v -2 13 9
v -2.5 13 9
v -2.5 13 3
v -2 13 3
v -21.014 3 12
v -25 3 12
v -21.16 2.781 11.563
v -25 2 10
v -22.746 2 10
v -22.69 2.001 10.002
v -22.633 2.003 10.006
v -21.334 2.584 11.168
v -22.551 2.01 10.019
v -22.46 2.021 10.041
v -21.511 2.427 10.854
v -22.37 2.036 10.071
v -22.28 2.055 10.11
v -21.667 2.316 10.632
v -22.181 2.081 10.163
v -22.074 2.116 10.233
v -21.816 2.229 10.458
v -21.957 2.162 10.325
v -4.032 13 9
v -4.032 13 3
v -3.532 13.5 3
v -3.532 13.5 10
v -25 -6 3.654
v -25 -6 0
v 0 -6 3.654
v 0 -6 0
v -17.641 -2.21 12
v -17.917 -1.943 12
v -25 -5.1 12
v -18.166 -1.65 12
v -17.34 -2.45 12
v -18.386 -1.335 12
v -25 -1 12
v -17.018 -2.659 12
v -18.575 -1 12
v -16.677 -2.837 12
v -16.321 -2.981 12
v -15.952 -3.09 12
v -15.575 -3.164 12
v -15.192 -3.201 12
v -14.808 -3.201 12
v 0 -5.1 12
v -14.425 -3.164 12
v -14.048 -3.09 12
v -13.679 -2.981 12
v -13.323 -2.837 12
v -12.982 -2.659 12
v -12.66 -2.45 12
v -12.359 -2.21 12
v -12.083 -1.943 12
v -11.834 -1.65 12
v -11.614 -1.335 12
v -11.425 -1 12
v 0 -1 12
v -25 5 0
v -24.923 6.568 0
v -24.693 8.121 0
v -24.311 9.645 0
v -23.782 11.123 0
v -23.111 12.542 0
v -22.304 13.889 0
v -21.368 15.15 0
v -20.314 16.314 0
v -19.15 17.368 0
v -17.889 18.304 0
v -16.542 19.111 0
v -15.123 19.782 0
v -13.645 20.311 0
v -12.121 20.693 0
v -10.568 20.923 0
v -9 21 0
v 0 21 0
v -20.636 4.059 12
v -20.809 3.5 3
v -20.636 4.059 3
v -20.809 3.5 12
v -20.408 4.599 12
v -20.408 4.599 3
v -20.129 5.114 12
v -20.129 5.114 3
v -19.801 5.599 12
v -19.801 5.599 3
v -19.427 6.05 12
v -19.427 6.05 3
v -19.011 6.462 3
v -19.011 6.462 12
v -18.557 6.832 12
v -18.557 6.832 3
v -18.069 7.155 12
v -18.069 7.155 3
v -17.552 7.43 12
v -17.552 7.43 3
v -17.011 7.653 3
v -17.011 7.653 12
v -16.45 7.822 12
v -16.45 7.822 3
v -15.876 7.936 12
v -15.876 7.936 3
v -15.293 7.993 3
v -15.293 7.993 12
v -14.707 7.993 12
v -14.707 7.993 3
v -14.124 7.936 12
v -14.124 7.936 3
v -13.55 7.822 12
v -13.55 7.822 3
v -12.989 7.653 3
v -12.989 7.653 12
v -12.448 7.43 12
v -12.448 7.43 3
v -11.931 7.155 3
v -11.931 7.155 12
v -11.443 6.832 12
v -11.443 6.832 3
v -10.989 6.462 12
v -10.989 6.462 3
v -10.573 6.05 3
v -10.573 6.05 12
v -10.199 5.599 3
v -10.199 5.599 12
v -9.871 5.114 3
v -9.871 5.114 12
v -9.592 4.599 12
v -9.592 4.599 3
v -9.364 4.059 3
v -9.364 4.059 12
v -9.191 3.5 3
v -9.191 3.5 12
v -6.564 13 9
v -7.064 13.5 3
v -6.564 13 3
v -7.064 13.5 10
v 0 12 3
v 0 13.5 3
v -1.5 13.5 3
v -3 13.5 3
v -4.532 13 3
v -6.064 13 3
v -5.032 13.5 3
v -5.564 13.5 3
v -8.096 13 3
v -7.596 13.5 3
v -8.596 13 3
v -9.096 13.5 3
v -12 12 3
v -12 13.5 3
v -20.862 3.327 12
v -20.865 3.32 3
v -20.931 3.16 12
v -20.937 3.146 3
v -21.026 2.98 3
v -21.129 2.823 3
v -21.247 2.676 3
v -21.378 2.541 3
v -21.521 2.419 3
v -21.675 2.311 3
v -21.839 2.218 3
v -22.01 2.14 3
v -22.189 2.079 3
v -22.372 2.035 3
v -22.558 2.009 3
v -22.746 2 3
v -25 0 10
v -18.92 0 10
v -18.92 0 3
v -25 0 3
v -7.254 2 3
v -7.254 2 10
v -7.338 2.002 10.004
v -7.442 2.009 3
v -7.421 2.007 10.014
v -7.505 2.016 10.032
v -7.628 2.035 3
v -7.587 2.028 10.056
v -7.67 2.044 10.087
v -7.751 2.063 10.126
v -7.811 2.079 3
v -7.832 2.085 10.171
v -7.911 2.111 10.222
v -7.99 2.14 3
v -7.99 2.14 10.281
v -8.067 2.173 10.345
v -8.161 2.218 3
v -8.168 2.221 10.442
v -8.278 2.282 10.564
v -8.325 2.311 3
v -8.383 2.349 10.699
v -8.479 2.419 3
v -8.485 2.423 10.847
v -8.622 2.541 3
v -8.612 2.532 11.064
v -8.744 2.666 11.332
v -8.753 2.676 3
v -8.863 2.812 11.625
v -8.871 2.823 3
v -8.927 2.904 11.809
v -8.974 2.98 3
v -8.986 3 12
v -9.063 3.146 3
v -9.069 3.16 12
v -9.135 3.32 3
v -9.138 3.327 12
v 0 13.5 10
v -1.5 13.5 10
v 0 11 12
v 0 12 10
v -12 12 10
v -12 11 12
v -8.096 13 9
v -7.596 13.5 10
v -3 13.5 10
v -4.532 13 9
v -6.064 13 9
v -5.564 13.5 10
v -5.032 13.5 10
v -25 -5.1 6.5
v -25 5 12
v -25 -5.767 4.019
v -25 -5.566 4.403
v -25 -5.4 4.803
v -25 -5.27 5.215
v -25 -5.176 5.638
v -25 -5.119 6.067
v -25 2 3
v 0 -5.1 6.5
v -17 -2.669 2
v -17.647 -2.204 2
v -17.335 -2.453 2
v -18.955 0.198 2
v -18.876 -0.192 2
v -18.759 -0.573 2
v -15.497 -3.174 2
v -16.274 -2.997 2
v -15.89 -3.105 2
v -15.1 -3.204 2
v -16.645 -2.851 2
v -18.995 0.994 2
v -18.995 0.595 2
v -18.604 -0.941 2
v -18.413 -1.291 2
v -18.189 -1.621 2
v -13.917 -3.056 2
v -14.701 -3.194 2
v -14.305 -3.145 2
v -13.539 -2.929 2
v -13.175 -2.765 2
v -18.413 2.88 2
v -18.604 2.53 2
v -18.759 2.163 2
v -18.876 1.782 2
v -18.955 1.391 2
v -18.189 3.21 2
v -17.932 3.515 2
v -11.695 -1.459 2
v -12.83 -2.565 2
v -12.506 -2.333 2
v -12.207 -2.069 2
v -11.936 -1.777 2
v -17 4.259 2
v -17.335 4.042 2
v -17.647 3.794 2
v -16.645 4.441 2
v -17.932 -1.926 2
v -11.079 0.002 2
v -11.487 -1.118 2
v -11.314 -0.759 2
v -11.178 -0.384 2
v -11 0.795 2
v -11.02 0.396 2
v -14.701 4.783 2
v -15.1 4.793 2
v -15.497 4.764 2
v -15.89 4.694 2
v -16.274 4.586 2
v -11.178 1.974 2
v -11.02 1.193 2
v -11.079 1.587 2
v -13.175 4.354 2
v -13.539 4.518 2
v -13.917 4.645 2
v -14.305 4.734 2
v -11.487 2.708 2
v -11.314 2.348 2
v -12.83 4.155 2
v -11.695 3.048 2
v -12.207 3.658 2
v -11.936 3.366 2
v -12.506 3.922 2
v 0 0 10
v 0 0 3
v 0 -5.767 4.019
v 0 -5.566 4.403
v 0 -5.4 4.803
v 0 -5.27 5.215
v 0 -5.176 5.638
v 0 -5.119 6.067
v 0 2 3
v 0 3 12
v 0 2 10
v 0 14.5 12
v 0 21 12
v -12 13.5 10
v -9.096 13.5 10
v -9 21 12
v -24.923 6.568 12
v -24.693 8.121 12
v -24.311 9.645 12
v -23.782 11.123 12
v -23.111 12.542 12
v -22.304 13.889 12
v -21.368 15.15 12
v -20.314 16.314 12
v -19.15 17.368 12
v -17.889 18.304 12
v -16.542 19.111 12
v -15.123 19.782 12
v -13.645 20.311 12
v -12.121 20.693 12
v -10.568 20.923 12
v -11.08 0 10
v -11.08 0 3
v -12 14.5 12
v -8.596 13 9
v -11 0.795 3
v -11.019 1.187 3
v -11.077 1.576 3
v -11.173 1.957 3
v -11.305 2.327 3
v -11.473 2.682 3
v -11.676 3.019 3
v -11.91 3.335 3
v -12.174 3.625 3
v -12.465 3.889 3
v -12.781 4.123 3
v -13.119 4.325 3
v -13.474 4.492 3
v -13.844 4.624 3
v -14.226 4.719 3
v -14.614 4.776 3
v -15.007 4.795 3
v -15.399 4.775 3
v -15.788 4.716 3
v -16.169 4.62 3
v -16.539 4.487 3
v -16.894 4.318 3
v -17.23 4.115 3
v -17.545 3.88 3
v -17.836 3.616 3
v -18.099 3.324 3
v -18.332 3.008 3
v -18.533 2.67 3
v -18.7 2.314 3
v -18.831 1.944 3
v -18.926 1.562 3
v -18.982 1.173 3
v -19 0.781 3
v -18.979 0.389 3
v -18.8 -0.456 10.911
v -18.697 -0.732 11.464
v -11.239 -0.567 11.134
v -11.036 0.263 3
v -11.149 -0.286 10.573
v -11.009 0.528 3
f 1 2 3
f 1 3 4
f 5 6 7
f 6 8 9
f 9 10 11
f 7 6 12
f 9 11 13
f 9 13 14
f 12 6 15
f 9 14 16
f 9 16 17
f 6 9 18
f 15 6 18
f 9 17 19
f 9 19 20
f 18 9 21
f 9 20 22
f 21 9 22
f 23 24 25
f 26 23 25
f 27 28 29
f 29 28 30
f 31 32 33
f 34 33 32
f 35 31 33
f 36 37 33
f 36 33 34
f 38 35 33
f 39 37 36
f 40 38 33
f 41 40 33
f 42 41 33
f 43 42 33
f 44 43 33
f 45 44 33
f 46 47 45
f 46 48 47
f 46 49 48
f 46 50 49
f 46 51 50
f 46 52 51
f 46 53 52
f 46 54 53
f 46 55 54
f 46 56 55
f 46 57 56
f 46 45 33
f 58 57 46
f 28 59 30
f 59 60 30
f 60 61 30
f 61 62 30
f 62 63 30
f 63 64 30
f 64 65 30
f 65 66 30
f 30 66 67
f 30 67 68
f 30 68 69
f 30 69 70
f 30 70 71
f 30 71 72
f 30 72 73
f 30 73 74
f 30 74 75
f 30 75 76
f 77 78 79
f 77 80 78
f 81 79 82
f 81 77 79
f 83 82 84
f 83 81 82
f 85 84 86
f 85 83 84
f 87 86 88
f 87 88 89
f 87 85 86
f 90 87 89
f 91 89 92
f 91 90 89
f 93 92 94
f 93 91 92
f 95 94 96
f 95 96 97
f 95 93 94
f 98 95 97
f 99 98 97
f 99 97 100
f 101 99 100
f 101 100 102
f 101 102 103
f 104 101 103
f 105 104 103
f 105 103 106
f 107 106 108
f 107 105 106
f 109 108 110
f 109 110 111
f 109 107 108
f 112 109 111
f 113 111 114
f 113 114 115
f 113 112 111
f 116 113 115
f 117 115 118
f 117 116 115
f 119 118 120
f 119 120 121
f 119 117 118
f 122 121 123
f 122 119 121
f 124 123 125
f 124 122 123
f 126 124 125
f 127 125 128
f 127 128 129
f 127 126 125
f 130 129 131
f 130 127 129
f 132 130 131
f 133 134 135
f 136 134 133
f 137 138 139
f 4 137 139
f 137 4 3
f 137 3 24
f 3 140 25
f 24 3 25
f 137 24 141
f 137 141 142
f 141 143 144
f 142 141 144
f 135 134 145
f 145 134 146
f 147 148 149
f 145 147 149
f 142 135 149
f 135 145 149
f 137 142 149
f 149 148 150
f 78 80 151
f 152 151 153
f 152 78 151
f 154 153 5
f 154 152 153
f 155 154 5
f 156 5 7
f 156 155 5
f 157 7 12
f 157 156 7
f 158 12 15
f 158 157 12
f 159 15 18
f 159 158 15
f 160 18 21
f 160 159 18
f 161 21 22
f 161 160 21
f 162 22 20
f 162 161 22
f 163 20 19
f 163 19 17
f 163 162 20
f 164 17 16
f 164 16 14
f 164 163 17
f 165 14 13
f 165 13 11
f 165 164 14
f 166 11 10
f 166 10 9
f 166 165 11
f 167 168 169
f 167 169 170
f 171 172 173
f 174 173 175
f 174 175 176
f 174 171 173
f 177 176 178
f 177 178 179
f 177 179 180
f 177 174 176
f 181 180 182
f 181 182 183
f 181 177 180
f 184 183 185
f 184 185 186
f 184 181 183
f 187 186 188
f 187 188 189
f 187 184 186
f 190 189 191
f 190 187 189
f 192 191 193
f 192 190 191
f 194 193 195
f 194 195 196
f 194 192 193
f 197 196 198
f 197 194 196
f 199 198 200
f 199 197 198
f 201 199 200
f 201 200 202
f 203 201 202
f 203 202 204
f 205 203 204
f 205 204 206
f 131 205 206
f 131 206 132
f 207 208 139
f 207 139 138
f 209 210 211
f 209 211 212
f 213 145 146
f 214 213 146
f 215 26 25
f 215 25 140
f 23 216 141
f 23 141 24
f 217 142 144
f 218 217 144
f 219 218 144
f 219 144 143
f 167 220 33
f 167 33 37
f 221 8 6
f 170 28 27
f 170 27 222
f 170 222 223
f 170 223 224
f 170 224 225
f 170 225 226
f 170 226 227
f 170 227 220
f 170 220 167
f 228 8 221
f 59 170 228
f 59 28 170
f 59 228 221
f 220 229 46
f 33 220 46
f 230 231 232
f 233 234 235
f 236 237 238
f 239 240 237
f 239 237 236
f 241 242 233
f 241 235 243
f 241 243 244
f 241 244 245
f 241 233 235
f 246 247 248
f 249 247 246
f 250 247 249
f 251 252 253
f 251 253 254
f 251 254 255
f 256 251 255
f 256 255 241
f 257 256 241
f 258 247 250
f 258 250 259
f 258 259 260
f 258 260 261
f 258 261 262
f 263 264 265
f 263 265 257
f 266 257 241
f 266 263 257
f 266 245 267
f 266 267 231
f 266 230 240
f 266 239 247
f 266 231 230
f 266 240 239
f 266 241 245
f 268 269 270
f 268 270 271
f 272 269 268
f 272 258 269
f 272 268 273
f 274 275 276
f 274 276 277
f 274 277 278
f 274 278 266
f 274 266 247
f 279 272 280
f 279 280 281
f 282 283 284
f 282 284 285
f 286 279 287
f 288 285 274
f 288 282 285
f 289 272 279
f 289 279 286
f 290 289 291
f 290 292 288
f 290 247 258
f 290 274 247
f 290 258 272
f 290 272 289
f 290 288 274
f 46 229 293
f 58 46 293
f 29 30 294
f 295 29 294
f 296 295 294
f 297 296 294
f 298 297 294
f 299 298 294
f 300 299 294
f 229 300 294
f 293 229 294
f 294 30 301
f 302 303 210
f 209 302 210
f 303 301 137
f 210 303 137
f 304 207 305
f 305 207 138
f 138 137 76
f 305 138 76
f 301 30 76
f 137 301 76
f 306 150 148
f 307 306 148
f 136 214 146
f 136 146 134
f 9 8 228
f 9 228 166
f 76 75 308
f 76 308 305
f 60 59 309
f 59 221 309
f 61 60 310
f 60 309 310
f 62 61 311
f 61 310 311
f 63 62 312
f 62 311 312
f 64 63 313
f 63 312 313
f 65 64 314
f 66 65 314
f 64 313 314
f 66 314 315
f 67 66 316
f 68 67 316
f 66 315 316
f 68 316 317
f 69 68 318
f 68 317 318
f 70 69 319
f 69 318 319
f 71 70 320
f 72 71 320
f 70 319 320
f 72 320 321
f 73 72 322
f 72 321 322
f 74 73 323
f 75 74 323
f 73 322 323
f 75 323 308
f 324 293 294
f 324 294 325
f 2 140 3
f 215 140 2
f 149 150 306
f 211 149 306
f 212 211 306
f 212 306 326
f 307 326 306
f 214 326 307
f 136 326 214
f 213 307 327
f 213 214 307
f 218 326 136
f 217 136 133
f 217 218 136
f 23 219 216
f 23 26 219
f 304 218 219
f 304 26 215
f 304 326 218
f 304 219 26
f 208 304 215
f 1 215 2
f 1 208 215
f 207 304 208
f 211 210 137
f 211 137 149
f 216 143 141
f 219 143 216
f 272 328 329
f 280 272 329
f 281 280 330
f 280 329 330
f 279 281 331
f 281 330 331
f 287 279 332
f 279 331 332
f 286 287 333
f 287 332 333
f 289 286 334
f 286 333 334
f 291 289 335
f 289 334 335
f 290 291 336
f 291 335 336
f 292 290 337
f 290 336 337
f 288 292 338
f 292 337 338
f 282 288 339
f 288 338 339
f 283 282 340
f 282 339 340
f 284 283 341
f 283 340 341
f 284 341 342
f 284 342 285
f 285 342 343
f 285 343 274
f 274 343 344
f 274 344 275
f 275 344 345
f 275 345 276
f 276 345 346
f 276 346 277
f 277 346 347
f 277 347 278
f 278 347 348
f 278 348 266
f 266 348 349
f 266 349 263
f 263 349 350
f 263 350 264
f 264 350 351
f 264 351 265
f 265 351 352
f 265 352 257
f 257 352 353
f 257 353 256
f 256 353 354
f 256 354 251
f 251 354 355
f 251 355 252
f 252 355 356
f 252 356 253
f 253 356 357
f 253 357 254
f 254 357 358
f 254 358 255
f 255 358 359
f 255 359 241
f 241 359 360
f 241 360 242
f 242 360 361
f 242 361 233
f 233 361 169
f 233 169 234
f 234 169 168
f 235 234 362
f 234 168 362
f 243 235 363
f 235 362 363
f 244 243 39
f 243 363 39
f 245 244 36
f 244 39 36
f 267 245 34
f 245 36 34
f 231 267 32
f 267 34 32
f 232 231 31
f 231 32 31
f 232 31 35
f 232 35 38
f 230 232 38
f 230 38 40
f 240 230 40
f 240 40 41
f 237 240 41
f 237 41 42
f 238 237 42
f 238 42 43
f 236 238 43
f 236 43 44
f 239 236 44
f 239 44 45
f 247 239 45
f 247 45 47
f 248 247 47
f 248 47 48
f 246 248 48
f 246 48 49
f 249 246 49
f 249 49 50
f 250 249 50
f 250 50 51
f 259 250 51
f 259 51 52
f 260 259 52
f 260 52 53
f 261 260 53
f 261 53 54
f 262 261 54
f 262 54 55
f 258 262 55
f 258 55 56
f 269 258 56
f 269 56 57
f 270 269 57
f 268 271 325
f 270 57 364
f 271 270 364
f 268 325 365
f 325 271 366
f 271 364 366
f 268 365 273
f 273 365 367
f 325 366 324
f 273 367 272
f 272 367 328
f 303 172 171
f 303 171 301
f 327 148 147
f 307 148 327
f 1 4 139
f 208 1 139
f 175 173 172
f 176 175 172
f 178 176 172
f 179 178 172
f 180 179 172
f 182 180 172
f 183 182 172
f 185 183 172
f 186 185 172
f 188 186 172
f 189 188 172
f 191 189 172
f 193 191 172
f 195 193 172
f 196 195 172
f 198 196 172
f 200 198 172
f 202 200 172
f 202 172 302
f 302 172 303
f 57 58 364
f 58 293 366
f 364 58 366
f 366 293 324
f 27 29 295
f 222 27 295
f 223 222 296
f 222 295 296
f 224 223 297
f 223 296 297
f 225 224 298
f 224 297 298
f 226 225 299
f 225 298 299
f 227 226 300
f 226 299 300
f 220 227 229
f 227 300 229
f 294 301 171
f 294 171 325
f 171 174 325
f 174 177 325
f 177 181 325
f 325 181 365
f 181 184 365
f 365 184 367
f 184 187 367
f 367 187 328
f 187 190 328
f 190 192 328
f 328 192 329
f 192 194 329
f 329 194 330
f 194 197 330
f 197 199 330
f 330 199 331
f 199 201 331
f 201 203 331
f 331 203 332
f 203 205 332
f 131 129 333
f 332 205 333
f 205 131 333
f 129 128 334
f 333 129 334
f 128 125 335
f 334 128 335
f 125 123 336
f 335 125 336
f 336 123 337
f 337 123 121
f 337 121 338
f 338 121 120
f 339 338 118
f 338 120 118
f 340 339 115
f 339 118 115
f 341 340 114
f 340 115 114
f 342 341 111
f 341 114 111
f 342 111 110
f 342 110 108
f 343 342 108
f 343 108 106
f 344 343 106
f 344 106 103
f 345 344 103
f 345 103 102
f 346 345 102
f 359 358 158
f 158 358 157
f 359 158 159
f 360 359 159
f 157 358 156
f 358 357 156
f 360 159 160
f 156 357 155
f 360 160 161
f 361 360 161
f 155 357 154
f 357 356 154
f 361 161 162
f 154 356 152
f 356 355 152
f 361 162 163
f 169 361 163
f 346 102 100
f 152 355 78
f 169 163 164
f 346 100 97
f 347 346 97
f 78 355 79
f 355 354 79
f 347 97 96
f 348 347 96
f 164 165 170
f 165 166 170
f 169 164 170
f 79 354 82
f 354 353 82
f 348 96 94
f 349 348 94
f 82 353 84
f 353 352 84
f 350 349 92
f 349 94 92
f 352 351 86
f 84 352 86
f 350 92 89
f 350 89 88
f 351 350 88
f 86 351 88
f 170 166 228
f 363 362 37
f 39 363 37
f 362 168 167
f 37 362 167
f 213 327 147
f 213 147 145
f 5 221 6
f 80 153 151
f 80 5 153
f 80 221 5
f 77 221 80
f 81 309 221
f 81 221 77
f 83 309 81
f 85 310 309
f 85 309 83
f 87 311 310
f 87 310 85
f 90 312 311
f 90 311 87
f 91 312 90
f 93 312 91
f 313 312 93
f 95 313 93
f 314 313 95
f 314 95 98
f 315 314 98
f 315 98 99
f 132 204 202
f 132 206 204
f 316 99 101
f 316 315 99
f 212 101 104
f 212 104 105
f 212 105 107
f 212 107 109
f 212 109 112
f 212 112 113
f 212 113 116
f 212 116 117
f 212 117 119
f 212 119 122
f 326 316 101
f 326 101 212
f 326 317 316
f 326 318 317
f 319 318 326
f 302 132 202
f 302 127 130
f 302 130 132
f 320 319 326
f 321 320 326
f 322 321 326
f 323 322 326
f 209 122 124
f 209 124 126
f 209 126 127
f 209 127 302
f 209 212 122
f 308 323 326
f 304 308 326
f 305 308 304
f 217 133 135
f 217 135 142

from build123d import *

# Parameters (mm, degrees)
SKETCH1_W           = 25
SKETCH1_H           = 27
BOSS_EXTRUDE1_DEPTH = 12
CUT_EXTRUDE1_DEPTH  = 9
CUT_EXTRUDE2_DEPTH  = 26
FILLET1_R           = 16
CHAMFER2_SIZE       = 1
CHAMFER2_SIZE2      = 2
CHAMFER3_SIZE       = 1
CHAMFER3_SIZE2      = 2
CUT_EXTRUDE4_DEPTH  = 12
FILLET2_R           = 2
SKETCH6_R           = 4
CUT_EXTRUDE5_DEPTH  = 10


with BuildPart() as part:
    # Sketch1 → Boss-Extrude1 (new body)
    with BuildSketch(Plane.XY):
        with Locations((-12.5, 7.5)):
            Rectangle(SKETCH1_W, SKETCH1_H)
    extrude(amount=BOSS_EXTRUDE1_DEPTH)

    # Sketch2 → Cut-Extrude1 (cut)
    with BuildSketch(Plane.XY.offset(12)):
        with BuildLine():
            Line((0, 0), (-25, 0))
            Line((-25, 0), (-25, 2))
            Line((-25, 2), (-21, 2))
            ThreePointArc((-21, 2), (-15, 8), (-9, 2))
            Line((-9, 2), (0, 2))
            Line((0, 2), (0, 0))
        make_face()
        Polygon((0, 12), (-12, 12), (-12, 13.5), (-9.096, 13.5), (-8.596, 13), (-8.096, 13), (-7.596, 13.5), (-7.064, 13.5), (-6.564, 13), (-6.064, 13), (-5.564, 13.5), (-5.032, 13.5), (-4.532, 13), (-4.032, 13), (-3.532, 13.5), (-3, 13.5), (-2.5, 13), (-2, 13), (-1.5, 13.5), (0, 13.5), align=None)
    extrude(amount=-CUT_EXTRUDE1_DEPTH, mode=Mode.SUBTRACT)

    # Sketch3 → Cut-Extrude2 (cut, through all)
    with BuildSketch(Plane(origin=(0, 0, 0), x_dir=(0, 0, -1), z_dir=(1, 0, 0))):
        with BuildLine():
            Line((-6.5, -5.1), (-14.907534026, -5.1))
            Line((-14.907534026, -5.1), (-14.907534026, -15))
            Line((-14.907534026, -15), (-6.5, -15))
            ThreePointArc((-6.5, -15), (-1.55, -10.05), (-6.5, -5.1))
        make_face()
    extrude(amount=-CUT_EXTRUDE2_DEPTH, mode=Mode.SUBTRACT)

    # Fillet1
    fillet1_edges = [part.edges().sort_by_distance(p)[0] for p in [
        (-25, 21, 6),
    ]]
    fillet(fillet1_edges, radius=FILLET1_R)

    # Chamfer2
    chamfer2_edges = [part.edges().sort_by_distance(p)[0] for p in [
        (-4.5, 2, 12),
        (-23, 2, 12),
    ]]
    chamfer2_side = [part.faces().sort_by_distance(p)[0] for p in [
        (-10.97729814, 11.640214696, 12),
    ]]
    chamfer(chamfer2_edges, length=CHAMFER2_SIZE, length2=CHAMFER2_SIZE2, reference=chamfer2_side[0])

    # Chamfer3
    chamfer3_edges = [part.edges().sort_by_distance(p)[0] for p in [
        (-12.5, 0, 12),
    ]]
    chamfer3_side = [part.faces().sort_by_distance(p)[0] for p in [
        (-12.5, -2.55, 12),
    ]]
    chamfer(chamfer3_edges, length=CHAMFER3_SIZE, length2=CHAMFER3_SIZE2, reference=chamfer3_side[0])

    # Sketch5 → Cut-Extrude4 (cut)
    with BuildSketch(Plane(origin=(0, 0, 0), x_dir=(0, 0, -1), z_dir=(1, 0, 0))):
        Polygon((-12, 14.5), (-8.5, 12.75), (-12, 11), (-12, 12), (-12, 13.5), align=None)
    extrude(amount=-CUT_EXTRUDE4_DEPTH, mode=Mode.SUBTRACT)

    # Fillet2
    fillet2_edges = [part.edges().sort_by_distance(p)[0] for p in [
        (-9, 2, 6.5),
        (-21, 2, 6.5),
    ]]
    fillet(fillet2_edges, radius=FILLET2_R)

    # Sketch6 → Cut-Extrude5 (cut)
    with BuildSketch(Plane.XY.offset(12)):
        with Locations((-15, 0.794645258)):
            Circle(SKETCH6_R)
    extrude(amount=-CUT_EXTRUDE5_DEPTH, mode=Mode.SUBTRACT)


solid = part.part
